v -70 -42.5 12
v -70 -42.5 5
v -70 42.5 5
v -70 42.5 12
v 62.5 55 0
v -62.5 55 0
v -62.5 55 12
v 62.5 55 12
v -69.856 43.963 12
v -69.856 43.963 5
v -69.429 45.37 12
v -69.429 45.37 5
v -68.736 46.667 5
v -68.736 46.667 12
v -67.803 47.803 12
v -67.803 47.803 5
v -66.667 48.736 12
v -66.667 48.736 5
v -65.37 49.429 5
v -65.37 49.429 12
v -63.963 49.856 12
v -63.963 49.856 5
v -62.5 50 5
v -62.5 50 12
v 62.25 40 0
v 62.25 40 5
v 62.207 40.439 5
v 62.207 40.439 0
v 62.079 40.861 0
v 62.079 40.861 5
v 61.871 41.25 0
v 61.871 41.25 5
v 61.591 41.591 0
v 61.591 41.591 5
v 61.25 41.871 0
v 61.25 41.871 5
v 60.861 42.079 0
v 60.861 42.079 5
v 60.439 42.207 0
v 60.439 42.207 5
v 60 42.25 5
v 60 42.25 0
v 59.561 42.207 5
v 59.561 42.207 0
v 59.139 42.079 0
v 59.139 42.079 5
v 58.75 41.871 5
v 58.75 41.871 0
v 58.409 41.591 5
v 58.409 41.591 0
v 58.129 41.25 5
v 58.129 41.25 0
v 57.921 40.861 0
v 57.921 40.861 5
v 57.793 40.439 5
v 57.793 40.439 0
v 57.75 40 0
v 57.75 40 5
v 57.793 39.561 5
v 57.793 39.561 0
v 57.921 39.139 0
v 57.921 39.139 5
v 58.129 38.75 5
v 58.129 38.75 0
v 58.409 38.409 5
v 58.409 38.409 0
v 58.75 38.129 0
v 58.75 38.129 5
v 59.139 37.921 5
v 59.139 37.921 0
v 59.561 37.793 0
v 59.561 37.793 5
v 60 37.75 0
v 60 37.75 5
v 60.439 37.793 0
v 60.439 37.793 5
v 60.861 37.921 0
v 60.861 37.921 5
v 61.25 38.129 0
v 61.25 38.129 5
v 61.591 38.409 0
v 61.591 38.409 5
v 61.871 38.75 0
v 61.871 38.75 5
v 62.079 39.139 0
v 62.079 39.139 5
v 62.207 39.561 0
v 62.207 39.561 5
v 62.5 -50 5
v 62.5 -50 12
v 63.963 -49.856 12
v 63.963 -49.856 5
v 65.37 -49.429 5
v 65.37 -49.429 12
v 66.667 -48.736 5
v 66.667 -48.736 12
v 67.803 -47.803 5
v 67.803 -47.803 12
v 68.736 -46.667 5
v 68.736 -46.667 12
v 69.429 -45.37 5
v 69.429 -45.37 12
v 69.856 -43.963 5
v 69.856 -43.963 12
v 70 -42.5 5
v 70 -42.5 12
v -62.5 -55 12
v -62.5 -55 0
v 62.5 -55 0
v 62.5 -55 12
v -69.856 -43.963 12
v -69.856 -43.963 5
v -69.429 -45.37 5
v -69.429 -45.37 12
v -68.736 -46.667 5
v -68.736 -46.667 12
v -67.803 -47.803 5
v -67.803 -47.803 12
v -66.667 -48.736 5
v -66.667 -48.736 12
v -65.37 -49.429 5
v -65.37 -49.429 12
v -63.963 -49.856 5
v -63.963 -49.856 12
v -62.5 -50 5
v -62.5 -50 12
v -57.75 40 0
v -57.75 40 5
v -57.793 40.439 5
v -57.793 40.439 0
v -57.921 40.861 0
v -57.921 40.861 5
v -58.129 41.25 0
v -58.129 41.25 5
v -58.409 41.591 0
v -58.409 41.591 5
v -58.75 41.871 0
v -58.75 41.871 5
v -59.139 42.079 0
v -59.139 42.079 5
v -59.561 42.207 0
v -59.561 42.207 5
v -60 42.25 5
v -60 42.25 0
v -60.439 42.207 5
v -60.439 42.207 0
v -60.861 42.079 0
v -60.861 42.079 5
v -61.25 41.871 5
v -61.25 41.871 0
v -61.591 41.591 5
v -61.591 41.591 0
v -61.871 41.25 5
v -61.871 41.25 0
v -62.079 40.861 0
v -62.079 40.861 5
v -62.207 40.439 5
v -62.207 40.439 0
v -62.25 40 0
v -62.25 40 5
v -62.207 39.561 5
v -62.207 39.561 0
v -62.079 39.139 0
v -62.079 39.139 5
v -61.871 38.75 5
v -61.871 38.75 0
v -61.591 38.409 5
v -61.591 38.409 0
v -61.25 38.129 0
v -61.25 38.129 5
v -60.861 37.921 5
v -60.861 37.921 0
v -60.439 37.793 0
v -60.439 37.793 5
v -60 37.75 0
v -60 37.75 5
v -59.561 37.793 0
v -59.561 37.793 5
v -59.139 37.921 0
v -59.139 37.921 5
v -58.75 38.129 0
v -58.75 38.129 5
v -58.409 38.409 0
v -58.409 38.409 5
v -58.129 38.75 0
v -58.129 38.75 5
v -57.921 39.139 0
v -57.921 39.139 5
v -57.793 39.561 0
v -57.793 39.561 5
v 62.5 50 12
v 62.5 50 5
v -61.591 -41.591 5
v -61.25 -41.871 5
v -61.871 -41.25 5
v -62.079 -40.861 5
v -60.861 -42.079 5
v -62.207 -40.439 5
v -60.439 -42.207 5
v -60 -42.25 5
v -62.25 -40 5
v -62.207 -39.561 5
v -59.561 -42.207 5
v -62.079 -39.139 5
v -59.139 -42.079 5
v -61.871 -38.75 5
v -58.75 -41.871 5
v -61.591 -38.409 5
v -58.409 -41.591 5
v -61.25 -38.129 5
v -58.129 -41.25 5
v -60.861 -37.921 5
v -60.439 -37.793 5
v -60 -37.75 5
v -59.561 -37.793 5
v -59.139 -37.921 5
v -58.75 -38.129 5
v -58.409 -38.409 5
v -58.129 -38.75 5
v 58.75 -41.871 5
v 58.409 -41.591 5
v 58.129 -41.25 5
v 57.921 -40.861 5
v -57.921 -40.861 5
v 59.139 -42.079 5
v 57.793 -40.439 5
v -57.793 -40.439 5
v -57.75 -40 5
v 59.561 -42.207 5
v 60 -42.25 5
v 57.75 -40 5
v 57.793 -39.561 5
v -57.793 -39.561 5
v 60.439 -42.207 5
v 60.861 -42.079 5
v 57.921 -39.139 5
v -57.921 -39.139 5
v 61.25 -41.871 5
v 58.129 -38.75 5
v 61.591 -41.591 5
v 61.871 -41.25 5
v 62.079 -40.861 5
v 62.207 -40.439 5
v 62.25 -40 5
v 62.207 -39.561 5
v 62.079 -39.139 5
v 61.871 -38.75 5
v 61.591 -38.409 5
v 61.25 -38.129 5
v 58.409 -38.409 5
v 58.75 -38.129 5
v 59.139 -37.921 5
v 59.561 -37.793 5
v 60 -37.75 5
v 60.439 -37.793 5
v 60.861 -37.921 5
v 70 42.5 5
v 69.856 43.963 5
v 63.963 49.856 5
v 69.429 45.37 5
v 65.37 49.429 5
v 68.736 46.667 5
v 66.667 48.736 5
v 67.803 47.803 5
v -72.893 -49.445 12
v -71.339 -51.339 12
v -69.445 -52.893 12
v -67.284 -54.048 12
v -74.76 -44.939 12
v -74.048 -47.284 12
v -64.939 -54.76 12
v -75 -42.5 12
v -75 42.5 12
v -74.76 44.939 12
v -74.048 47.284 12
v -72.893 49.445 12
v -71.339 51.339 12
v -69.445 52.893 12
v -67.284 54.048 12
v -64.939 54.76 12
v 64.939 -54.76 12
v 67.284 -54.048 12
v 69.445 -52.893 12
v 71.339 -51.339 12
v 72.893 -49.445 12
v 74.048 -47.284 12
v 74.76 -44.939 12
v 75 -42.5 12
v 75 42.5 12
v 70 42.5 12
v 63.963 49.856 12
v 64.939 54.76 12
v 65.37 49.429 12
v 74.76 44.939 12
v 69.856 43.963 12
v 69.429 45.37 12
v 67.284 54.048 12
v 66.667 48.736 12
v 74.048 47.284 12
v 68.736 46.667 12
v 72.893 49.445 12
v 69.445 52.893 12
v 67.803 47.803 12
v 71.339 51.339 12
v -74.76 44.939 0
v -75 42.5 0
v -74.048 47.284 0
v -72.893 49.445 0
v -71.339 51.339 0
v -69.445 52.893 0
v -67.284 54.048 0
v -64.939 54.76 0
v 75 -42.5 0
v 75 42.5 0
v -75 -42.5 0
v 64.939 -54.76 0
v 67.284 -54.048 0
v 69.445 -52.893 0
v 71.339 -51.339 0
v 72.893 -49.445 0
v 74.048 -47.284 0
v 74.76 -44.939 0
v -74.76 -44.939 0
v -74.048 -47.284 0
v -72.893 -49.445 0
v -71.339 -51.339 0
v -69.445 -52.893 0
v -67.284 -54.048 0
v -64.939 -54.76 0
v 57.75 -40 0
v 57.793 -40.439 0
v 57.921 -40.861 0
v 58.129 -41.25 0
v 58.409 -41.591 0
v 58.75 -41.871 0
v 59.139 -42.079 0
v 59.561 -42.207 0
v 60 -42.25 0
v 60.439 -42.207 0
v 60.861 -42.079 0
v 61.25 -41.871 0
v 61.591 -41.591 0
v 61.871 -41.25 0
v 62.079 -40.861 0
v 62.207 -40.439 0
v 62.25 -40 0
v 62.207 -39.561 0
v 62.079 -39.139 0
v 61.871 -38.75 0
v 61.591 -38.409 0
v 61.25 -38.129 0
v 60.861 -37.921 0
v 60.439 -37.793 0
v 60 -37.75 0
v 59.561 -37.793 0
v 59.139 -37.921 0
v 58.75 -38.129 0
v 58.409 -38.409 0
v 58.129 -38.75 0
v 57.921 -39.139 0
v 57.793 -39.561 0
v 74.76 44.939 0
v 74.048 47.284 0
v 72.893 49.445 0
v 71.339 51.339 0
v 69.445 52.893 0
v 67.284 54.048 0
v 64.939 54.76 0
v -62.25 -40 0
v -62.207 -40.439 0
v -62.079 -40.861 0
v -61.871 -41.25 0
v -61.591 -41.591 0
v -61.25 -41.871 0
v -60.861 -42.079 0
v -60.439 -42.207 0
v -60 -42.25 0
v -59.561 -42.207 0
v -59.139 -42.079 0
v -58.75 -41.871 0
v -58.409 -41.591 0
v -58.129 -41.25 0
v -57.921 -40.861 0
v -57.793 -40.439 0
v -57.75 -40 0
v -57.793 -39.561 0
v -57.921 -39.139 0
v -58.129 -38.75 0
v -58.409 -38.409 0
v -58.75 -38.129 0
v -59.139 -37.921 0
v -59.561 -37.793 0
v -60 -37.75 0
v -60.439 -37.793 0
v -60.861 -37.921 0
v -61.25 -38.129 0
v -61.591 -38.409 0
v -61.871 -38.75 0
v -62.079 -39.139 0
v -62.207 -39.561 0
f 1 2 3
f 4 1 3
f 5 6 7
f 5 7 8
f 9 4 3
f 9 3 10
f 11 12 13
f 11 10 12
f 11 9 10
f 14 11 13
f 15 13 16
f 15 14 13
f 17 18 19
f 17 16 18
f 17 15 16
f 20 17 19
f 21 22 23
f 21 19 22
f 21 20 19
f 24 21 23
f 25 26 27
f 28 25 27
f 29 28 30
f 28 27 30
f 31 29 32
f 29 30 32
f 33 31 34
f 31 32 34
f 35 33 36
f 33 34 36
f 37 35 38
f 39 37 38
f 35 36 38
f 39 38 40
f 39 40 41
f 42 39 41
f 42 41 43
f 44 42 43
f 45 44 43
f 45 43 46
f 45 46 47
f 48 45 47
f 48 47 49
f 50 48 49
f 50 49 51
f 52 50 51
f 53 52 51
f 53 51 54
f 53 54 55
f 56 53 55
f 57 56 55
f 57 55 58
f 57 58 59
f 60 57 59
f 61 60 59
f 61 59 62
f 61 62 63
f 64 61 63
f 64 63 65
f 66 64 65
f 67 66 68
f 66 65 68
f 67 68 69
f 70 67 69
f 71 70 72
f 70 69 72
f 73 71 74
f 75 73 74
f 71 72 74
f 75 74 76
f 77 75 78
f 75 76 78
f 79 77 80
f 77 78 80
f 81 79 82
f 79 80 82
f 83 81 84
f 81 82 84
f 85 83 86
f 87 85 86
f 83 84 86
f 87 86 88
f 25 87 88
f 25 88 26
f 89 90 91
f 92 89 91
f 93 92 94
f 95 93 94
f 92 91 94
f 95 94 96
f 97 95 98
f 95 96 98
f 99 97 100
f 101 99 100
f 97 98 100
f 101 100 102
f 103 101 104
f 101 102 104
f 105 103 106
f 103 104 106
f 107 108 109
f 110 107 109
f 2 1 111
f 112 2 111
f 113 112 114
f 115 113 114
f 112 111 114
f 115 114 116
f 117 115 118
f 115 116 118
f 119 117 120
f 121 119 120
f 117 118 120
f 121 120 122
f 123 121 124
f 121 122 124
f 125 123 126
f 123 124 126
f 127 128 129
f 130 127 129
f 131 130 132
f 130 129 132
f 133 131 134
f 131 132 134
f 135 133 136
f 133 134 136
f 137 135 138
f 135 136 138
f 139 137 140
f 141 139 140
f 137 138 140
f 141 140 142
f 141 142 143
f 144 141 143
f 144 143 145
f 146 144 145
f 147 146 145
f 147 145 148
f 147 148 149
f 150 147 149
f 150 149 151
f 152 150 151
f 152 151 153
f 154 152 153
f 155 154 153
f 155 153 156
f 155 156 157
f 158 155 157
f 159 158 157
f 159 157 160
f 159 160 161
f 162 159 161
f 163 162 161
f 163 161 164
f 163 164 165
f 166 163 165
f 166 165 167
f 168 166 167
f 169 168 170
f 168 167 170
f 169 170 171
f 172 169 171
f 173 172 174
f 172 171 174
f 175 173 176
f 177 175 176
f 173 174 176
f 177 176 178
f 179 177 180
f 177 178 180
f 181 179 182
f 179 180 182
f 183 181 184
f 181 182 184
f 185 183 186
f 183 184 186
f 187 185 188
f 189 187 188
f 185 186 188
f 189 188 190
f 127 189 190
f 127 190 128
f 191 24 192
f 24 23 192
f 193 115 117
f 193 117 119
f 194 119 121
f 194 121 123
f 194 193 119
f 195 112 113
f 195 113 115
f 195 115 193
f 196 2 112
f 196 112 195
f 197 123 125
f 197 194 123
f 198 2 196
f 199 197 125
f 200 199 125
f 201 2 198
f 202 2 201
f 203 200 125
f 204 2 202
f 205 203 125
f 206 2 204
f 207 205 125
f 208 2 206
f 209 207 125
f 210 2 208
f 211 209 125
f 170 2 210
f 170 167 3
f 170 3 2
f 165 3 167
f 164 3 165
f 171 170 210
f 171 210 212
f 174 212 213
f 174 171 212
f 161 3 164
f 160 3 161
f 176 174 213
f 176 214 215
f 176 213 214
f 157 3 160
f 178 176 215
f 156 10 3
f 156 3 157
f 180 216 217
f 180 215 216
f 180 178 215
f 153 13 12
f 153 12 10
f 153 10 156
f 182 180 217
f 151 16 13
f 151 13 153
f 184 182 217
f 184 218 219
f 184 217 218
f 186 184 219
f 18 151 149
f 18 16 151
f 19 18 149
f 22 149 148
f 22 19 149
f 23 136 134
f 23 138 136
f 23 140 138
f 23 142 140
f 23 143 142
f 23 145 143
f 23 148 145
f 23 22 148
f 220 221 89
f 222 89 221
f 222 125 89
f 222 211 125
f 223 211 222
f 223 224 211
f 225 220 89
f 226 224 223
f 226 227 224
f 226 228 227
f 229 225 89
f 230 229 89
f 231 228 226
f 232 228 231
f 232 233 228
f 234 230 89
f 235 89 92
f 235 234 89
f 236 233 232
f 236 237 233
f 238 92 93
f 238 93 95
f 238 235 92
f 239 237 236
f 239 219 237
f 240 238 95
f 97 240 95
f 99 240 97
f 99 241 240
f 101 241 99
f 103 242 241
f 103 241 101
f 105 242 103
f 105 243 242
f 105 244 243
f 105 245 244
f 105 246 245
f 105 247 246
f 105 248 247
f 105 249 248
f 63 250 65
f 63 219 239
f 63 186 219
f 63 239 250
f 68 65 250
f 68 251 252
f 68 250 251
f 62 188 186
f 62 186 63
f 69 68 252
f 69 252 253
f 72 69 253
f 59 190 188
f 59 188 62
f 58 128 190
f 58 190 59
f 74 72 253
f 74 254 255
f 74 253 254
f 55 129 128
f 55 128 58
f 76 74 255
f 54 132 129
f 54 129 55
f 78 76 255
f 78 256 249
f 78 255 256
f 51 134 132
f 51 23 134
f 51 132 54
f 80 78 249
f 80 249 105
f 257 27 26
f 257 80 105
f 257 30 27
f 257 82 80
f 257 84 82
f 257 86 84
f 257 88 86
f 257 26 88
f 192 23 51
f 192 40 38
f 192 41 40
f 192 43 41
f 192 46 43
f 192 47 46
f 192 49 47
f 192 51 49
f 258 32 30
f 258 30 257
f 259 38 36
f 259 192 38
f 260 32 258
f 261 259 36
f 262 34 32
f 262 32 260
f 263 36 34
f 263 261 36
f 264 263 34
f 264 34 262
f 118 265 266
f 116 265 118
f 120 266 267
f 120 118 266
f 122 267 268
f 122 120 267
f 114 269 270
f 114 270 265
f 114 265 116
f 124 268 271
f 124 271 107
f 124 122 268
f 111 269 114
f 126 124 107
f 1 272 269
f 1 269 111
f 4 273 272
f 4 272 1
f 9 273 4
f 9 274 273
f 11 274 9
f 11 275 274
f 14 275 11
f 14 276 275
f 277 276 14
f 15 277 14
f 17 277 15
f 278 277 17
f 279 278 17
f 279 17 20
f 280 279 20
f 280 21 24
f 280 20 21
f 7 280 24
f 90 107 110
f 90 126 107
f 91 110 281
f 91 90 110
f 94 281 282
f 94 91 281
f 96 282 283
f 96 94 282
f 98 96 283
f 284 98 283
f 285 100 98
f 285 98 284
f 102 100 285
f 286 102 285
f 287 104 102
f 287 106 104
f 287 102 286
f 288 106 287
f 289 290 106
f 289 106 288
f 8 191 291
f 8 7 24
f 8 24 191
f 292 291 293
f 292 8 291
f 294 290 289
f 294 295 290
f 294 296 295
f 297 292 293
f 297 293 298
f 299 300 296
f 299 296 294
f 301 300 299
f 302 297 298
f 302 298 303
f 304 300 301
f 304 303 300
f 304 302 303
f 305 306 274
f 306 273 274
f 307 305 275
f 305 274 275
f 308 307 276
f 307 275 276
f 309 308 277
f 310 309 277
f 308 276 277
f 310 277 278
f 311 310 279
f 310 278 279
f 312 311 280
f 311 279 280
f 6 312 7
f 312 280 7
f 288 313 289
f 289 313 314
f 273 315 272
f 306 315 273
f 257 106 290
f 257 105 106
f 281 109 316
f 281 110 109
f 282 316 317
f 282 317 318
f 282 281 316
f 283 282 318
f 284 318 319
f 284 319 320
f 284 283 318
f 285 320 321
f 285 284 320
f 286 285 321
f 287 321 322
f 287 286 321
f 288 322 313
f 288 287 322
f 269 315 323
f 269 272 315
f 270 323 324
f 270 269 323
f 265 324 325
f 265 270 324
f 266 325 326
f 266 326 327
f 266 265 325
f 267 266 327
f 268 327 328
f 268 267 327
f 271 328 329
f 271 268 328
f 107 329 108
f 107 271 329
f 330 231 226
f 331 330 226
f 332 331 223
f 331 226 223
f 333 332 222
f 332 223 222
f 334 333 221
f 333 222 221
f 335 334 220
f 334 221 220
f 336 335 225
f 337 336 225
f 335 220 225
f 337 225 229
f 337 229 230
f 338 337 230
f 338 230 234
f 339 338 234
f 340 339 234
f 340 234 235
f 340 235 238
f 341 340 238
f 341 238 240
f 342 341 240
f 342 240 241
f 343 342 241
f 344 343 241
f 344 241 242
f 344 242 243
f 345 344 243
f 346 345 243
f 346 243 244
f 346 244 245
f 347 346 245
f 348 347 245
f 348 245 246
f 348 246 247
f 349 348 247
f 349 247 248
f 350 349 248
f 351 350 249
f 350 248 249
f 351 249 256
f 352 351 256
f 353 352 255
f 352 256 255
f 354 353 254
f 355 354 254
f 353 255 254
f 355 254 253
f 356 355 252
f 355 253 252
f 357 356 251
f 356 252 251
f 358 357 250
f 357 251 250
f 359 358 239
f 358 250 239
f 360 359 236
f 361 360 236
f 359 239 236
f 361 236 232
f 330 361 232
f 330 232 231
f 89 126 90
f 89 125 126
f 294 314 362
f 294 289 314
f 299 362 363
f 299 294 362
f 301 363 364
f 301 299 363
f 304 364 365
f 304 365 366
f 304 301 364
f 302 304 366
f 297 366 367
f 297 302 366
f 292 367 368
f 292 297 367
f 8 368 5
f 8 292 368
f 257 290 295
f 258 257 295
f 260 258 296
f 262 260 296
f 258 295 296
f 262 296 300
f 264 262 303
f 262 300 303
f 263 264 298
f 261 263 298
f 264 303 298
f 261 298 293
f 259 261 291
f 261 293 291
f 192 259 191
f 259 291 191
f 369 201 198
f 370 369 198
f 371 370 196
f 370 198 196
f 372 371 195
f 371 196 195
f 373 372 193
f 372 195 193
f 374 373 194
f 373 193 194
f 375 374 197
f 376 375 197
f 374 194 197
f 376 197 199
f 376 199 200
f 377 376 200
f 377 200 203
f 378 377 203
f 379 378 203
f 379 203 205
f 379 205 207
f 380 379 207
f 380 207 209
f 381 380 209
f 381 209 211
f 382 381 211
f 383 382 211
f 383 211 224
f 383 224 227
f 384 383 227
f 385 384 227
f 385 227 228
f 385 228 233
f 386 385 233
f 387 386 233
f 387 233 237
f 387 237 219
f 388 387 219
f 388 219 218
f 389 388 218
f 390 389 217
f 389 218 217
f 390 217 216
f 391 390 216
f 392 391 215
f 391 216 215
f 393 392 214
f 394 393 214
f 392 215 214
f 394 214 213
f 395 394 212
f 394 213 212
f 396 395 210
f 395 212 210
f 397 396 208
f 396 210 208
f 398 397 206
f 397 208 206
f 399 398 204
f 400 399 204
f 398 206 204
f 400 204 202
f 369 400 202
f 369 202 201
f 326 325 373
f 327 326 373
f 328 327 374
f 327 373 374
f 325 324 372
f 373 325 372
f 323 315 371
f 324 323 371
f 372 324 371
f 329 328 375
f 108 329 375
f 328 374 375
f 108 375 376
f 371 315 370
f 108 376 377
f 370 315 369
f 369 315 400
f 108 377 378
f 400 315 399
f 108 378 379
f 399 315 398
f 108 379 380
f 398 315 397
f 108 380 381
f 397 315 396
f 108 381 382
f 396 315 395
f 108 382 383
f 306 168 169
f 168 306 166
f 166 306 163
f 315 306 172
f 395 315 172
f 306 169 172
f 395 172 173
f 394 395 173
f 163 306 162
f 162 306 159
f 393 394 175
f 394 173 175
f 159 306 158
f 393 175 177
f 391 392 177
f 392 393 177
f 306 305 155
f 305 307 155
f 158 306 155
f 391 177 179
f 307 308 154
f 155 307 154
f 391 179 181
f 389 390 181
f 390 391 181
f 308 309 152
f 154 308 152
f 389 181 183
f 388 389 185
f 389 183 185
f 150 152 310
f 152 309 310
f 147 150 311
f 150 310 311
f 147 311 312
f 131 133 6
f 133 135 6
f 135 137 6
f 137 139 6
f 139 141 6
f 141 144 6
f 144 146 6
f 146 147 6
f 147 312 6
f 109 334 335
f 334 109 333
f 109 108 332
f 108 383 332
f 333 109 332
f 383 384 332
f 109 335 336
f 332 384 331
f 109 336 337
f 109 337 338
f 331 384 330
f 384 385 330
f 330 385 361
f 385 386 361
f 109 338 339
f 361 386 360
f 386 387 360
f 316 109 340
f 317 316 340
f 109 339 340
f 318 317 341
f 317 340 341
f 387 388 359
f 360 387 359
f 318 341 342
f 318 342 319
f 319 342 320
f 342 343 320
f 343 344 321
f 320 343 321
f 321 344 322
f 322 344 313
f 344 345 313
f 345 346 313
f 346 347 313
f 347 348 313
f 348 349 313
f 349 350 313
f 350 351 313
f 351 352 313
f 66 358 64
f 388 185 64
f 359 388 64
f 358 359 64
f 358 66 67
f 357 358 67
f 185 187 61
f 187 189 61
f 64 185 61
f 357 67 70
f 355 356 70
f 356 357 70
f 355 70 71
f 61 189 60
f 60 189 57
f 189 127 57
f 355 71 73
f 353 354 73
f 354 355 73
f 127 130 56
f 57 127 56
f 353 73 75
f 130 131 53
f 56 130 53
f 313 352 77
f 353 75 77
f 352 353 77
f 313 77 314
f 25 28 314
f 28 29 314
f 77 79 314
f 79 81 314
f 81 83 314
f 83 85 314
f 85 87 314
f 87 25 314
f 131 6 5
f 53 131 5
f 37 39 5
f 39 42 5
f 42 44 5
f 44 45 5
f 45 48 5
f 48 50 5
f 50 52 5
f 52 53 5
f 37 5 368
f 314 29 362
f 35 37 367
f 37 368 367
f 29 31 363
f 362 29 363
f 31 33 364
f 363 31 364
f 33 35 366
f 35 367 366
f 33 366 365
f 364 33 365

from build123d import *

# Parameters (mm, degrees)
SKETCH_1_W          = 150
SKETCH_1_H          = 110
EXTRUDE_1_DEPTH     = 12
FILLET_1_R          = 12.5
SHELL_1_T           = -5
SKETCH_3_R          = 2.25
CUT_EXTRUDE_1_DEPTH = 94.268429814


with BuildPart() as part:
    # 草图1 → 凸台-拉伸1 (new body)
    with BuildSketch(Plane.XY):
        Rectangle(SKETCH_1_W, SKETCH_1_H)
    extrude(amount=EXTRUDE_1_DEPTH)

    # 圆角1
    fillet_1_edges = [part.edges().sort_by_distance(p)[0] for p in [
        (75, -55, 6),
        (-75, -55, 6),
        (-75, 55, 6),
        (75, 55, 6),
    ]]
    fillet(fillet_1_edges, radius=FILLET_1_R)

    # 抽壳1
    shell_1_openings = [part.faces().sort_by_distance(p)[0] for p in [
        (0, 0, 12),
    ]]
    offset(amount=SHELL_1_T, openings=shell_1_openings, kind=Kind.INTERSECTION)

    # 草图3 → 切除-拉伸1 (cut, through all)
    with BuildSketch(Plane.XY.offset(5)):
        with Locations((-60, 40)):
            Circle(SKETCH_3_R)
        with Locations((60, 40)):
            Circle(SKETCH_3_R)
        with Locations(Location((60, -40, 0), (0, 0, 180))):
            Circle(SKETCH_3_R)
        with Locations(Location((-60, -40, 0), (0, 0, 180))):
            Circle(SKETCH_3_R)
    extrude(amount=-CUT_EXTRUDE_1_DEPTH, mode=Mode.SUBTRACT)


solid = part.part
